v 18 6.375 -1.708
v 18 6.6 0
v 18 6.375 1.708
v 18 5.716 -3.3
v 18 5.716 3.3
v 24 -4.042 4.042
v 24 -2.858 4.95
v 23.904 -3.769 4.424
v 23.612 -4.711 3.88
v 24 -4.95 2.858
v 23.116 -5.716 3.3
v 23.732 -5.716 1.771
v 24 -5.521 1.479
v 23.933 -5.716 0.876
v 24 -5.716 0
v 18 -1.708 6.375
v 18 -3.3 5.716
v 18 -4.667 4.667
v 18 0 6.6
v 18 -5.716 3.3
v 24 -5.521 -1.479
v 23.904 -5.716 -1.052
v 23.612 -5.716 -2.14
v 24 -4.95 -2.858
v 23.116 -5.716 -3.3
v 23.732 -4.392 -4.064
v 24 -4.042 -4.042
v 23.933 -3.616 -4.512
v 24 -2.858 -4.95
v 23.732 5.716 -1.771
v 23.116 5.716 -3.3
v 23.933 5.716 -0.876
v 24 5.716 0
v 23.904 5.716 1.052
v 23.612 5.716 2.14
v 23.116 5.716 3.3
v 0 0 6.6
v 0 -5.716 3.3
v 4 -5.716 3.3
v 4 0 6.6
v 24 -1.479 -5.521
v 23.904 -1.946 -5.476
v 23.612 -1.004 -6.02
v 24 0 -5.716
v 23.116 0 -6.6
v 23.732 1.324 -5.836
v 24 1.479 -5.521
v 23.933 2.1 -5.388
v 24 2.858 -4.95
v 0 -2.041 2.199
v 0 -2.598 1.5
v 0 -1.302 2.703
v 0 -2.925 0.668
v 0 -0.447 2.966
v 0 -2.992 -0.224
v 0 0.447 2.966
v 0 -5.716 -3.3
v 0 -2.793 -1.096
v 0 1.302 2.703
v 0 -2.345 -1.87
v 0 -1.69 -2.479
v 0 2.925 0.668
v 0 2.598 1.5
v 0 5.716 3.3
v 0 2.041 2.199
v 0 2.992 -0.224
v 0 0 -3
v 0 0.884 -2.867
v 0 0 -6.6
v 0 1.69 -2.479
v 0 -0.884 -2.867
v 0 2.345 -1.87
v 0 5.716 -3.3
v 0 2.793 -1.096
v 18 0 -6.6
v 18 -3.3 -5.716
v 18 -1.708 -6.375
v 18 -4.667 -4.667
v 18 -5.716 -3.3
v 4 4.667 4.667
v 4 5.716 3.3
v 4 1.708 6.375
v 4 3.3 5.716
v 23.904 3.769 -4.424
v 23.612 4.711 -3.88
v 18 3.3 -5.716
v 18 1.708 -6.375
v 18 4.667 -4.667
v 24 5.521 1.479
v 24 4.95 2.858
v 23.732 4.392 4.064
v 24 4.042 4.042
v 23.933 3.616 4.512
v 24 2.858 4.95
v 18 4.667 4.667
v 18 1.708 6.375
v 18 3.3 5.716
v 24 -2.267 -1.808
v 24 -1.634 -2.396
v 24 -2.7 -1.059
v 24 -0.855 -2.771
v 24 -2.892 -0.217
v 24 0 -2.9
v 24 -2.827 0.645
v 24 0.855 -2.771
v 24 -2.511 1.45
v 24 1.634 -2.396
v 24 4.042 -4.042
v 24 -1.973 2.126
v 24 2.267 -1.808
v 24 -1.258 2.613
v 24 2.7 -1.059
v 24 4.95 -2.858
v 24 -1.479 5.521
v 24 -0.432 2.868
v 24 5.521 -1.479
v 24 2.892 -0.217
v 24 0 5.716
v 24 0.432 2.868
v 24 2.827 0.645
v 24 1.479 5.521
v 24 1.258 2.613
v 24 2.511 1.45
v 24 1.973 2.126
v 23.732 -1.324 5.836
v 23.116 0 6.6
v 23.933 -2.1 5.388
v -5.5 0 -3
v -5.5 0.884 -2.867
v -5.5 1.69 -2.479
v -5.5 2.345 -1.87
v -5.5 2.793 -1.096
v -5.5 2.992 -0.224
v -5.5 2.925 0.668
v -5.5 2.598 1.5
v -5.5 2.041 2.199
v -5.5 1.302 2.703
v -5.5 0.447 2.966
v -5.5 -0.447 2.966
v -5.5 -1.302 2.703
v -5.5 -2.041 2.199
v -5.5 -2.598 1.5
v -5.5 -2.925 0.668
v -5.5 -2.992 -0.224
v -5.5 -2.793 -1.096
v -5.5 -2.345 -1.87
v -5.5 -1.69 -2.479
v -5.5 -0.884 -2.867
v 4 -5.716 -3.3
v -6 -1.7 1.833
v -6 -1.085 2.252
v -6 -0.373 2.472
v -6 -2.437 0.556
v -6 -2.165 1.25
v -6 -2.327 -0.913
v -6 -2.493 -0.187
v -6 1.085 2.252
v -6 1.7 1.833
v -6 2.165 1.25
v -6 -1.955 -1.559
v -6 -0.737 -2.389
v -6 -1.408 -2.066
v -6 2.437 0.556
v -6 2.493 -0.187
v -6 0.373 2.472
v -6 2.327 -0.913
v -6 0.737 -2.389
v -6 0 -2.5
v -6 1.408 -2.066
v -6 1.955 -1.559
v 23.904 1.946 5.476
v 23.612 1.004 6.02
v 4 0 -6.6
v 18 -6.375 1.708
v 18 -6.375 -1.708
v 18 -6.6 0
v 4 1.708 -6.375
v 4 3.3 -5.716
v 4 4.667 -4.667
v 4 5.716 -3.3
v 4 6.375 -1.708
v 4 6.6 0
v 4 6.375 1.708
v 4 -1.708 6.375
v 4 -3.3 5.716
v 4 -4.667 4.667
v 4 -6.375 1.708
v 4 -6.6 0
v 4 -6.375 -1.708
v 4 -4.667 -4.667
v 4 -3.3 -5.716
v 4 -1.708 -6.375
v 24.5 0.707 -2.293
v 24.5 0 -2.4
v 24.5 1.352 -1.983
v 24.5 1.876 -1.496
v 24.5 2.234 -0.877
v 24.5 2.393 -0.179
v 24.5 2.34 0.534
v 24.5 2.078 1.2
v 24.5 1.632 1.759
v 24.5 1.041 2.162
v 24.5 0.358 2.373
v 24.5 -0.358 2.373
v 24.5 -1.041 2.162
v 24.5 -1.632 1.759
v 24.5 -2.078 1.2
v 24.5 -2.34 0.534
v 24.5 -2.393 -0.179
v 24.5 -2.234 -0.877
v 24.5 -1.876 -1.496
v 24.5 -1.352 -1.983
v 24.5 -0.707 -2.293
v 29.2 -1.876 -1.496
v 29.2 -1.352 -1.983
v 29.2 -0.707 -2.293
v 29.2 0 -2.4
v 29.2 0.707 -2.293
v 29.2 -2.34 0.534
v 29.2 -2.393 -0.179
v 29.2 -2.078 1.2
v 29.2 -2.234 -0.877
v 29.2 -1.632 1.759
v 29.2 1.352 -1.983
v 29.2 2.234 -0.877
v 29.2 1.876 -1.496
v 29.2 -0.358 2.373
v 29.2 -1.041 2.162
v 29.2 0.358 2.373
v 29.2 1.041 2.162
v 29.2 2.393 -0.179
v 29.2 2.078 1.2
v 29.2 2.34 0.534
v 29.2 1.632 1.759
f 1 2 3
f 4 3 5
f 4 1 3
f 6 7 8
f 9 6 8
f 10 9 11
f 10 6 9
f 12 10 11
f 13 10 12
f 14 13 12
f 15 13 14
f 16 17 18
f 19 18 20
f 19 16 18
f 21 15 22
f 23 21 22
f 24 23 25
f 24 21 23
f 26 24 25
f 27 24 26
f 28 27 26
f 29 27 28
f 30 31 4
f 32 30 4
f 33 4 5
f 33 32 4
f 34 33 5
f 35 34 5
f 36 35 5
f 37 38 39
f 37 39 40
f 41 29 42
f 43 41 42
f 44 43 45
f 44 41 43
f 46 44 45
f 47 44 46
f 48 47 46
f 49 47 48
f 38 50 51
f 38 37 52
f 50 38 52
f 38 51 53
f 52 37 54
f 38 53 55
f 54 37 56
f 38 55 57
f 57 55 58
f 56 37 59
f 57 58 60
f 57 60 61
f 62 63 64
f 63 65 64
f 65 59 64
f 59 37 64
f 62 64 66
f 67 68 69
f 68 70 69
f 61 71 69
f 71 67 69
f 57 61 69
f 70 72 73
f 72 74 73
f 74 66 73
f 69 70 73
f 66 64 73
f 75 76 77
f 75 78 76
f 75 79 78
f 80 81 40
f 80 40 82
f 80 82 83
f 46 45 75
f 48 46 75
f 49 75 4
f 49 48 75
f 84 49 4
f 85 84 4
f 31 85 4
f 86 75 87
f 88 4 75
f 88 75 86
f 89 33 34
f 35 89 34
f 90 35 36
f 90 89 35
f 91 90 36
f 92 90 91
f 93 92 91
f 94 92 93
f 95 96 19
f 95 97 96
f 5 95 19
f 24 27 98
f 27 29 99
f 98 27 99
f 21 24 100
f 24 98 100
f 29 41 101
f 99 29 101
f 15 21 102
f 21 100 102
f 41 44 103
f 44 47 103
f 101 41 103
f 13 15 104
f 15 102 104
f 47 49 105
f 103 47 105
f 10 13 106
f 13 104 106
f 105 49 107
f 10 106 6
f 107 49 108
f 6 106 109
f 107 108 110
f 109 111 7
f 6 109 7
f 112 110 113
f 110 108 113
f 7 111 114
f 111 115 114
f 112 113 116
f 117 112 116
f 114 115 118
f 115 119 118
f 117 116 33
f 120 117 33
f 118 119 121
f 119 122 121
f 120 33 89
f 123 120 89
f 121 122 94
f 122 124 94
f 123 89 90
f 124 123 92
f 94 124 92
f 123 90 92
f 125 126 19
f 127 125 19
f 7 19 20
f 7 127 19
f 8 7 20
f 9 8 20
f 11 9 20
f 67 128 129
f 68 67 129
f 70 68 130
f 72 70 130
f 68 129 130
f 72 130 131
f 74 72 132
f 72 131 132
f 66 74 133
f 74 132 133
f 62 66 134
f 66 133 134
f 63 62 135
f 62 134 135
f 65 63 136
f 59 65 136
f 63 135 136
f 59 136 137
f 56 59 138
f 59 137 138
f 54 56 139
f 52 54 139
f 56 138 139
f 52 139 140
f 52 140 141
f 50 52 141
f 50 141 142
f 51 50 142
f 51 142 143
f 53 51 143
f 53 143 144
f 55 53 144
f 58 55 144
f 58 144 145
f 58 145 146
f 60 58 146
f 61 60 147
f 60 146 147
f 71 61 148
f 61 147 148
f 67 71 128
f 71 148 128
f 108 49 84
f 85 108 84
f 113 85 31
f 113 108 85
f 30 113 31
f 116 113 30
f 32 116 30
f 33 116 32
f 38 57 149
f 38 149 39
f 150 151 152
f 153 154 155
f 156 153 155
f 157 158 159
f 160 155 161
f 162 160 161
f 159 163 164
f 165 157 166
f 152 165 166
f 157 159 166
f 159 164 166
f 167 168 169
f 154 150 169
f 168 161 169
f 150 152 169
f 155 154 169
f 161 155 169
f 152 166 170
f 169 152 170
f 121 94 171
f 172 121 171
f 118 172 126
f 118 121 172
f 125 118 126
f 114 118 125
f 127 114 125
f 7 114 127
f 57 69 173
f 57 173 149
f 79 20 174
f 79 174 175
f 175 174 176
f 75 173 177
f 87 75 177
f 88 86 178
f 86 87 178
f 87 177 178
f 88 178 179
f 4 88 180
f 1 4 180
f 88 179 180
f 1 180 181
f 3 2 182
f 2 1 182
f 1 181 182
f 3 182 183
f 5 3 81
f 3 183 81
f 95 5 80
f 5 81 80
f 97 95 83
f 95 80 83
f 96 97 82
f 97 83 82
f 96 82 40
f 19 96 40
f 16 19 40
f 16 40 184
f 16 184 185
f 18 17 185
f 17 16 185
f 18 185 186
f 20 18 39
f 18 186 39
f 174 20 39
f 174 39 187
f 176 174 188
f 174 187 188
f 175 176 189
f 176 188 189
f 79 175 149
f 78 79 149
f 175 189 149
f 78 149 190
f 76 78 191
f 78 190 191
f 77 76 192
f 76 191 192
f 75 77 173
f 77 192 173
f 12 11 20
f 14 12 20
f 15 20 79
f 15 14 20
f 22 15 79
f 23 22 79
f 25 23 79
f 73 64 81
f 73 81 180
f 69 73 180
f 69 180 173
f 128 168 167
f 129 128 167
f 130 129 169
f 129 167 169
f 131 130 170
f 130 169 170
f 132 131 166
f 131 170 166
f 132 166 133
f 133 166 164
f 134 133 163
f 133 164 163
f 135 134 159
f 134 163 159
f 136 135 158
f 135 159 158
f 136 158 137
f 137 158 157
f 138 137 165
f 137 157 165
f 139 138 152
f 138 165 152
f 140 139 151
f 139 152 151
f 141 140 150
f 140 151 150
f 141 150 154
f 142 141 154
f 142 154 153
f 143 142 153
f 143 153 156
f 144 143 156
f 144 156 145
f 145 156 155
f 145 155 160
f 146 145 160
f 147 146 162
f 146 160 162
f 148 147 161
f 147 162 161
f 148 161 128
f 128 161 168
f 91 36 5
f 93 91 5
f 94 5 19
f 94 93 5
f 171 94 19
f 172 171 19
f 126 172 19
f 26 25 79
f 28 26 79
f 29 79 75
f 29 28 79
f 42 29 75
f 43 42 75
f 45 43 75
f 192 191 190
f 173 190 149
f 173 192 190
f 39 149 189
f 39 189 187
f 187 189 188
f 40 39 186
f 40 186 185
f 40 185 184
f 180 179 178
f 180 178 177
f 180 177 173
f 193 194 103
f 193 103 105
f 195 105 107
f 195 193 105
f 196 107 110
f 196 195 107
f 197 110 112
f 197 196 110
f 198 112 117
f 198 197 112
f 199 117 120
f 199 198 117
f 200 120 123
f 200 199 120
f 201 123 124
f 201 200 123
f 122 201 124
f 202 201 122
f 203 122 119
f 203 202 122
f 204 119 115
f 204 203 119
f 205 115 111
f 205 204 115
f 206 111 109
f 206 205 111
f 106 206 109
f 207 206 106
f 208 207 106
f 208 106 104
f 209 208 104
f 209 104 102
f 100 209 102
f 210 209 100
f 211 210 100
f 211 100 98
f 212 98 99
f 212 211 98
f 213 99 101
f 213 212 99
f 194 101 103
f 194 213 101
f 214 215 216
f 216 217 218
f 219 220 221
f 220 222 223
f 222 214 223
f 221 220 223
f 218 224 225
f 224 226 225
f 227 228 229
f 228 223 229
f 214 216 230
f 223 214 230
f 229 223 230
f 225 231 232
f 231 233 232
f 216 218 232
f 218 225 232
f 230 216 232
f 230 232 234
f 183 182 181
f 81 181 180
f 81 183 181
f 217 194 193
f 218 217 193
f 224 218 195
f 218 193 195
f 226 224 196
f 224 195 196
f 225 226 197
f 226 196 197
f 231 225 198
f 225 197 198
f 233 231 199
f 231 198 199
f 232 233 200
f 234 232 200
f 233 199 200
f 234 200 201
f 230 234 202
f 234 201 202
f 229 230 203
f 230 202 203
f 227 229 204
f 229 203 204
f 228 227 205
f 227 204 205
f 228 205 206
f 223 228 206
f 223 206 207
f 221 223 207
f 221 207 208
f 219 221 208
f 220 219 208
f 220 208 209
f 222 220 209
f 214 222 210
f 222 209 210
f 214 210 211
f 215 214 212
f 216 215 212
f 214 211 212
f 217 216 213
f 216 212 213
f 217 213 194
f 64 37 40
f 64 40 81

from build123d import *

# Parameters (mm, degrees)
SKETCH2_OUTSIDE_W  = 23.168
SKETCH2_OUTSIDE_H  = 23.168
CUT_EXTRUDE1_DEPTH = 6
SKETCH3_OUTSIDE_W  = 23.168
SKETCH3_OUTSIDE_H  = 23.168
CUT_EXTRUDE2_DEPTH = 4
CHAMFER1_SIZE      = 0.5


with BuildPart() as part:
    # Sketch1 → Revolve1 (revolve)
    with BuildSketch(Plane(origin=(0, 0, 0), x_dir=(1, 0, 0), z_dir=(0, 1, 0))):
        Polygon((0, 6.6), (0, 3), (-6, 3), (-6, 0), (29.2, 0), (29.2, 2.4), (24, 2.4), (24, 6.6), align=None)
    revolve(axis=Axis((-26.186440678, 0, 0), (1, 0, 0)))

    # Sketch2 outside → Cut-Extrude1 (cut)
    with BuildSketch(Plane(origin=(24, 0, 0), x_dir=(0, 0, -1), z_dir=(1, 0, 0))):
        Rectangle(SKETCH2_OUTSIDE_W, SKETCH2_OUTSIDE_H)
        Polygon((3.3, -5.715767665), (6.6, 0), (3.3, 5.715767665), (-3.3, 5.715767665), (-6.6, 0), (-3.3, -5.715767665), align=None, mode=Mode.SUBTRACT)
    extrude(amount=-CUT_EXTRUDE1_DEPTH, mode=Mode.SUBTRACT)

    # Sketch3 outside → Cut-Extrude2 (cut)
    with BuildSketch(Plane.ZY):
        Rectangle(SKETCH3_OUTSIDE_W, SKETCH3_OUTSIDE_H)
        Polygon((3.3, -5.715767665), (6.6, 0), (3.3, 5.715767665), (-3.3, 5.715767665), (-6.6, 0), (-3.3, -5.715767665), align=None, mode=Mode.SUBTRACT)
    extrude(amount=-CUT_EXTRUDE2_DEPTH, mode=Mode.SUBTRACT)

    # Sketch4 → Cut-Revolve1 (revolve, cut)
    with BuildSketch(Plane.XY):
        Polygon((22.019646918, 7.696120747), (25.980353082, 3.735414583), (25.980353082, 7.696120747), align=None)
    revolve(axis=Axis((-26.186440678, 0, 0), (1, 0, 0)), mode=Mode.SUBTRACT)

    # Chamfer1
    chamfer1_edges = [part.edges().sort_by_distance(p)[0] for p in [
        (24, 0, 2.4),
        (-6, 0, 3),
    ]]
    chamfer(chamfer1_edges, length=CHAMFER1_SIZE)


solid = part.part
